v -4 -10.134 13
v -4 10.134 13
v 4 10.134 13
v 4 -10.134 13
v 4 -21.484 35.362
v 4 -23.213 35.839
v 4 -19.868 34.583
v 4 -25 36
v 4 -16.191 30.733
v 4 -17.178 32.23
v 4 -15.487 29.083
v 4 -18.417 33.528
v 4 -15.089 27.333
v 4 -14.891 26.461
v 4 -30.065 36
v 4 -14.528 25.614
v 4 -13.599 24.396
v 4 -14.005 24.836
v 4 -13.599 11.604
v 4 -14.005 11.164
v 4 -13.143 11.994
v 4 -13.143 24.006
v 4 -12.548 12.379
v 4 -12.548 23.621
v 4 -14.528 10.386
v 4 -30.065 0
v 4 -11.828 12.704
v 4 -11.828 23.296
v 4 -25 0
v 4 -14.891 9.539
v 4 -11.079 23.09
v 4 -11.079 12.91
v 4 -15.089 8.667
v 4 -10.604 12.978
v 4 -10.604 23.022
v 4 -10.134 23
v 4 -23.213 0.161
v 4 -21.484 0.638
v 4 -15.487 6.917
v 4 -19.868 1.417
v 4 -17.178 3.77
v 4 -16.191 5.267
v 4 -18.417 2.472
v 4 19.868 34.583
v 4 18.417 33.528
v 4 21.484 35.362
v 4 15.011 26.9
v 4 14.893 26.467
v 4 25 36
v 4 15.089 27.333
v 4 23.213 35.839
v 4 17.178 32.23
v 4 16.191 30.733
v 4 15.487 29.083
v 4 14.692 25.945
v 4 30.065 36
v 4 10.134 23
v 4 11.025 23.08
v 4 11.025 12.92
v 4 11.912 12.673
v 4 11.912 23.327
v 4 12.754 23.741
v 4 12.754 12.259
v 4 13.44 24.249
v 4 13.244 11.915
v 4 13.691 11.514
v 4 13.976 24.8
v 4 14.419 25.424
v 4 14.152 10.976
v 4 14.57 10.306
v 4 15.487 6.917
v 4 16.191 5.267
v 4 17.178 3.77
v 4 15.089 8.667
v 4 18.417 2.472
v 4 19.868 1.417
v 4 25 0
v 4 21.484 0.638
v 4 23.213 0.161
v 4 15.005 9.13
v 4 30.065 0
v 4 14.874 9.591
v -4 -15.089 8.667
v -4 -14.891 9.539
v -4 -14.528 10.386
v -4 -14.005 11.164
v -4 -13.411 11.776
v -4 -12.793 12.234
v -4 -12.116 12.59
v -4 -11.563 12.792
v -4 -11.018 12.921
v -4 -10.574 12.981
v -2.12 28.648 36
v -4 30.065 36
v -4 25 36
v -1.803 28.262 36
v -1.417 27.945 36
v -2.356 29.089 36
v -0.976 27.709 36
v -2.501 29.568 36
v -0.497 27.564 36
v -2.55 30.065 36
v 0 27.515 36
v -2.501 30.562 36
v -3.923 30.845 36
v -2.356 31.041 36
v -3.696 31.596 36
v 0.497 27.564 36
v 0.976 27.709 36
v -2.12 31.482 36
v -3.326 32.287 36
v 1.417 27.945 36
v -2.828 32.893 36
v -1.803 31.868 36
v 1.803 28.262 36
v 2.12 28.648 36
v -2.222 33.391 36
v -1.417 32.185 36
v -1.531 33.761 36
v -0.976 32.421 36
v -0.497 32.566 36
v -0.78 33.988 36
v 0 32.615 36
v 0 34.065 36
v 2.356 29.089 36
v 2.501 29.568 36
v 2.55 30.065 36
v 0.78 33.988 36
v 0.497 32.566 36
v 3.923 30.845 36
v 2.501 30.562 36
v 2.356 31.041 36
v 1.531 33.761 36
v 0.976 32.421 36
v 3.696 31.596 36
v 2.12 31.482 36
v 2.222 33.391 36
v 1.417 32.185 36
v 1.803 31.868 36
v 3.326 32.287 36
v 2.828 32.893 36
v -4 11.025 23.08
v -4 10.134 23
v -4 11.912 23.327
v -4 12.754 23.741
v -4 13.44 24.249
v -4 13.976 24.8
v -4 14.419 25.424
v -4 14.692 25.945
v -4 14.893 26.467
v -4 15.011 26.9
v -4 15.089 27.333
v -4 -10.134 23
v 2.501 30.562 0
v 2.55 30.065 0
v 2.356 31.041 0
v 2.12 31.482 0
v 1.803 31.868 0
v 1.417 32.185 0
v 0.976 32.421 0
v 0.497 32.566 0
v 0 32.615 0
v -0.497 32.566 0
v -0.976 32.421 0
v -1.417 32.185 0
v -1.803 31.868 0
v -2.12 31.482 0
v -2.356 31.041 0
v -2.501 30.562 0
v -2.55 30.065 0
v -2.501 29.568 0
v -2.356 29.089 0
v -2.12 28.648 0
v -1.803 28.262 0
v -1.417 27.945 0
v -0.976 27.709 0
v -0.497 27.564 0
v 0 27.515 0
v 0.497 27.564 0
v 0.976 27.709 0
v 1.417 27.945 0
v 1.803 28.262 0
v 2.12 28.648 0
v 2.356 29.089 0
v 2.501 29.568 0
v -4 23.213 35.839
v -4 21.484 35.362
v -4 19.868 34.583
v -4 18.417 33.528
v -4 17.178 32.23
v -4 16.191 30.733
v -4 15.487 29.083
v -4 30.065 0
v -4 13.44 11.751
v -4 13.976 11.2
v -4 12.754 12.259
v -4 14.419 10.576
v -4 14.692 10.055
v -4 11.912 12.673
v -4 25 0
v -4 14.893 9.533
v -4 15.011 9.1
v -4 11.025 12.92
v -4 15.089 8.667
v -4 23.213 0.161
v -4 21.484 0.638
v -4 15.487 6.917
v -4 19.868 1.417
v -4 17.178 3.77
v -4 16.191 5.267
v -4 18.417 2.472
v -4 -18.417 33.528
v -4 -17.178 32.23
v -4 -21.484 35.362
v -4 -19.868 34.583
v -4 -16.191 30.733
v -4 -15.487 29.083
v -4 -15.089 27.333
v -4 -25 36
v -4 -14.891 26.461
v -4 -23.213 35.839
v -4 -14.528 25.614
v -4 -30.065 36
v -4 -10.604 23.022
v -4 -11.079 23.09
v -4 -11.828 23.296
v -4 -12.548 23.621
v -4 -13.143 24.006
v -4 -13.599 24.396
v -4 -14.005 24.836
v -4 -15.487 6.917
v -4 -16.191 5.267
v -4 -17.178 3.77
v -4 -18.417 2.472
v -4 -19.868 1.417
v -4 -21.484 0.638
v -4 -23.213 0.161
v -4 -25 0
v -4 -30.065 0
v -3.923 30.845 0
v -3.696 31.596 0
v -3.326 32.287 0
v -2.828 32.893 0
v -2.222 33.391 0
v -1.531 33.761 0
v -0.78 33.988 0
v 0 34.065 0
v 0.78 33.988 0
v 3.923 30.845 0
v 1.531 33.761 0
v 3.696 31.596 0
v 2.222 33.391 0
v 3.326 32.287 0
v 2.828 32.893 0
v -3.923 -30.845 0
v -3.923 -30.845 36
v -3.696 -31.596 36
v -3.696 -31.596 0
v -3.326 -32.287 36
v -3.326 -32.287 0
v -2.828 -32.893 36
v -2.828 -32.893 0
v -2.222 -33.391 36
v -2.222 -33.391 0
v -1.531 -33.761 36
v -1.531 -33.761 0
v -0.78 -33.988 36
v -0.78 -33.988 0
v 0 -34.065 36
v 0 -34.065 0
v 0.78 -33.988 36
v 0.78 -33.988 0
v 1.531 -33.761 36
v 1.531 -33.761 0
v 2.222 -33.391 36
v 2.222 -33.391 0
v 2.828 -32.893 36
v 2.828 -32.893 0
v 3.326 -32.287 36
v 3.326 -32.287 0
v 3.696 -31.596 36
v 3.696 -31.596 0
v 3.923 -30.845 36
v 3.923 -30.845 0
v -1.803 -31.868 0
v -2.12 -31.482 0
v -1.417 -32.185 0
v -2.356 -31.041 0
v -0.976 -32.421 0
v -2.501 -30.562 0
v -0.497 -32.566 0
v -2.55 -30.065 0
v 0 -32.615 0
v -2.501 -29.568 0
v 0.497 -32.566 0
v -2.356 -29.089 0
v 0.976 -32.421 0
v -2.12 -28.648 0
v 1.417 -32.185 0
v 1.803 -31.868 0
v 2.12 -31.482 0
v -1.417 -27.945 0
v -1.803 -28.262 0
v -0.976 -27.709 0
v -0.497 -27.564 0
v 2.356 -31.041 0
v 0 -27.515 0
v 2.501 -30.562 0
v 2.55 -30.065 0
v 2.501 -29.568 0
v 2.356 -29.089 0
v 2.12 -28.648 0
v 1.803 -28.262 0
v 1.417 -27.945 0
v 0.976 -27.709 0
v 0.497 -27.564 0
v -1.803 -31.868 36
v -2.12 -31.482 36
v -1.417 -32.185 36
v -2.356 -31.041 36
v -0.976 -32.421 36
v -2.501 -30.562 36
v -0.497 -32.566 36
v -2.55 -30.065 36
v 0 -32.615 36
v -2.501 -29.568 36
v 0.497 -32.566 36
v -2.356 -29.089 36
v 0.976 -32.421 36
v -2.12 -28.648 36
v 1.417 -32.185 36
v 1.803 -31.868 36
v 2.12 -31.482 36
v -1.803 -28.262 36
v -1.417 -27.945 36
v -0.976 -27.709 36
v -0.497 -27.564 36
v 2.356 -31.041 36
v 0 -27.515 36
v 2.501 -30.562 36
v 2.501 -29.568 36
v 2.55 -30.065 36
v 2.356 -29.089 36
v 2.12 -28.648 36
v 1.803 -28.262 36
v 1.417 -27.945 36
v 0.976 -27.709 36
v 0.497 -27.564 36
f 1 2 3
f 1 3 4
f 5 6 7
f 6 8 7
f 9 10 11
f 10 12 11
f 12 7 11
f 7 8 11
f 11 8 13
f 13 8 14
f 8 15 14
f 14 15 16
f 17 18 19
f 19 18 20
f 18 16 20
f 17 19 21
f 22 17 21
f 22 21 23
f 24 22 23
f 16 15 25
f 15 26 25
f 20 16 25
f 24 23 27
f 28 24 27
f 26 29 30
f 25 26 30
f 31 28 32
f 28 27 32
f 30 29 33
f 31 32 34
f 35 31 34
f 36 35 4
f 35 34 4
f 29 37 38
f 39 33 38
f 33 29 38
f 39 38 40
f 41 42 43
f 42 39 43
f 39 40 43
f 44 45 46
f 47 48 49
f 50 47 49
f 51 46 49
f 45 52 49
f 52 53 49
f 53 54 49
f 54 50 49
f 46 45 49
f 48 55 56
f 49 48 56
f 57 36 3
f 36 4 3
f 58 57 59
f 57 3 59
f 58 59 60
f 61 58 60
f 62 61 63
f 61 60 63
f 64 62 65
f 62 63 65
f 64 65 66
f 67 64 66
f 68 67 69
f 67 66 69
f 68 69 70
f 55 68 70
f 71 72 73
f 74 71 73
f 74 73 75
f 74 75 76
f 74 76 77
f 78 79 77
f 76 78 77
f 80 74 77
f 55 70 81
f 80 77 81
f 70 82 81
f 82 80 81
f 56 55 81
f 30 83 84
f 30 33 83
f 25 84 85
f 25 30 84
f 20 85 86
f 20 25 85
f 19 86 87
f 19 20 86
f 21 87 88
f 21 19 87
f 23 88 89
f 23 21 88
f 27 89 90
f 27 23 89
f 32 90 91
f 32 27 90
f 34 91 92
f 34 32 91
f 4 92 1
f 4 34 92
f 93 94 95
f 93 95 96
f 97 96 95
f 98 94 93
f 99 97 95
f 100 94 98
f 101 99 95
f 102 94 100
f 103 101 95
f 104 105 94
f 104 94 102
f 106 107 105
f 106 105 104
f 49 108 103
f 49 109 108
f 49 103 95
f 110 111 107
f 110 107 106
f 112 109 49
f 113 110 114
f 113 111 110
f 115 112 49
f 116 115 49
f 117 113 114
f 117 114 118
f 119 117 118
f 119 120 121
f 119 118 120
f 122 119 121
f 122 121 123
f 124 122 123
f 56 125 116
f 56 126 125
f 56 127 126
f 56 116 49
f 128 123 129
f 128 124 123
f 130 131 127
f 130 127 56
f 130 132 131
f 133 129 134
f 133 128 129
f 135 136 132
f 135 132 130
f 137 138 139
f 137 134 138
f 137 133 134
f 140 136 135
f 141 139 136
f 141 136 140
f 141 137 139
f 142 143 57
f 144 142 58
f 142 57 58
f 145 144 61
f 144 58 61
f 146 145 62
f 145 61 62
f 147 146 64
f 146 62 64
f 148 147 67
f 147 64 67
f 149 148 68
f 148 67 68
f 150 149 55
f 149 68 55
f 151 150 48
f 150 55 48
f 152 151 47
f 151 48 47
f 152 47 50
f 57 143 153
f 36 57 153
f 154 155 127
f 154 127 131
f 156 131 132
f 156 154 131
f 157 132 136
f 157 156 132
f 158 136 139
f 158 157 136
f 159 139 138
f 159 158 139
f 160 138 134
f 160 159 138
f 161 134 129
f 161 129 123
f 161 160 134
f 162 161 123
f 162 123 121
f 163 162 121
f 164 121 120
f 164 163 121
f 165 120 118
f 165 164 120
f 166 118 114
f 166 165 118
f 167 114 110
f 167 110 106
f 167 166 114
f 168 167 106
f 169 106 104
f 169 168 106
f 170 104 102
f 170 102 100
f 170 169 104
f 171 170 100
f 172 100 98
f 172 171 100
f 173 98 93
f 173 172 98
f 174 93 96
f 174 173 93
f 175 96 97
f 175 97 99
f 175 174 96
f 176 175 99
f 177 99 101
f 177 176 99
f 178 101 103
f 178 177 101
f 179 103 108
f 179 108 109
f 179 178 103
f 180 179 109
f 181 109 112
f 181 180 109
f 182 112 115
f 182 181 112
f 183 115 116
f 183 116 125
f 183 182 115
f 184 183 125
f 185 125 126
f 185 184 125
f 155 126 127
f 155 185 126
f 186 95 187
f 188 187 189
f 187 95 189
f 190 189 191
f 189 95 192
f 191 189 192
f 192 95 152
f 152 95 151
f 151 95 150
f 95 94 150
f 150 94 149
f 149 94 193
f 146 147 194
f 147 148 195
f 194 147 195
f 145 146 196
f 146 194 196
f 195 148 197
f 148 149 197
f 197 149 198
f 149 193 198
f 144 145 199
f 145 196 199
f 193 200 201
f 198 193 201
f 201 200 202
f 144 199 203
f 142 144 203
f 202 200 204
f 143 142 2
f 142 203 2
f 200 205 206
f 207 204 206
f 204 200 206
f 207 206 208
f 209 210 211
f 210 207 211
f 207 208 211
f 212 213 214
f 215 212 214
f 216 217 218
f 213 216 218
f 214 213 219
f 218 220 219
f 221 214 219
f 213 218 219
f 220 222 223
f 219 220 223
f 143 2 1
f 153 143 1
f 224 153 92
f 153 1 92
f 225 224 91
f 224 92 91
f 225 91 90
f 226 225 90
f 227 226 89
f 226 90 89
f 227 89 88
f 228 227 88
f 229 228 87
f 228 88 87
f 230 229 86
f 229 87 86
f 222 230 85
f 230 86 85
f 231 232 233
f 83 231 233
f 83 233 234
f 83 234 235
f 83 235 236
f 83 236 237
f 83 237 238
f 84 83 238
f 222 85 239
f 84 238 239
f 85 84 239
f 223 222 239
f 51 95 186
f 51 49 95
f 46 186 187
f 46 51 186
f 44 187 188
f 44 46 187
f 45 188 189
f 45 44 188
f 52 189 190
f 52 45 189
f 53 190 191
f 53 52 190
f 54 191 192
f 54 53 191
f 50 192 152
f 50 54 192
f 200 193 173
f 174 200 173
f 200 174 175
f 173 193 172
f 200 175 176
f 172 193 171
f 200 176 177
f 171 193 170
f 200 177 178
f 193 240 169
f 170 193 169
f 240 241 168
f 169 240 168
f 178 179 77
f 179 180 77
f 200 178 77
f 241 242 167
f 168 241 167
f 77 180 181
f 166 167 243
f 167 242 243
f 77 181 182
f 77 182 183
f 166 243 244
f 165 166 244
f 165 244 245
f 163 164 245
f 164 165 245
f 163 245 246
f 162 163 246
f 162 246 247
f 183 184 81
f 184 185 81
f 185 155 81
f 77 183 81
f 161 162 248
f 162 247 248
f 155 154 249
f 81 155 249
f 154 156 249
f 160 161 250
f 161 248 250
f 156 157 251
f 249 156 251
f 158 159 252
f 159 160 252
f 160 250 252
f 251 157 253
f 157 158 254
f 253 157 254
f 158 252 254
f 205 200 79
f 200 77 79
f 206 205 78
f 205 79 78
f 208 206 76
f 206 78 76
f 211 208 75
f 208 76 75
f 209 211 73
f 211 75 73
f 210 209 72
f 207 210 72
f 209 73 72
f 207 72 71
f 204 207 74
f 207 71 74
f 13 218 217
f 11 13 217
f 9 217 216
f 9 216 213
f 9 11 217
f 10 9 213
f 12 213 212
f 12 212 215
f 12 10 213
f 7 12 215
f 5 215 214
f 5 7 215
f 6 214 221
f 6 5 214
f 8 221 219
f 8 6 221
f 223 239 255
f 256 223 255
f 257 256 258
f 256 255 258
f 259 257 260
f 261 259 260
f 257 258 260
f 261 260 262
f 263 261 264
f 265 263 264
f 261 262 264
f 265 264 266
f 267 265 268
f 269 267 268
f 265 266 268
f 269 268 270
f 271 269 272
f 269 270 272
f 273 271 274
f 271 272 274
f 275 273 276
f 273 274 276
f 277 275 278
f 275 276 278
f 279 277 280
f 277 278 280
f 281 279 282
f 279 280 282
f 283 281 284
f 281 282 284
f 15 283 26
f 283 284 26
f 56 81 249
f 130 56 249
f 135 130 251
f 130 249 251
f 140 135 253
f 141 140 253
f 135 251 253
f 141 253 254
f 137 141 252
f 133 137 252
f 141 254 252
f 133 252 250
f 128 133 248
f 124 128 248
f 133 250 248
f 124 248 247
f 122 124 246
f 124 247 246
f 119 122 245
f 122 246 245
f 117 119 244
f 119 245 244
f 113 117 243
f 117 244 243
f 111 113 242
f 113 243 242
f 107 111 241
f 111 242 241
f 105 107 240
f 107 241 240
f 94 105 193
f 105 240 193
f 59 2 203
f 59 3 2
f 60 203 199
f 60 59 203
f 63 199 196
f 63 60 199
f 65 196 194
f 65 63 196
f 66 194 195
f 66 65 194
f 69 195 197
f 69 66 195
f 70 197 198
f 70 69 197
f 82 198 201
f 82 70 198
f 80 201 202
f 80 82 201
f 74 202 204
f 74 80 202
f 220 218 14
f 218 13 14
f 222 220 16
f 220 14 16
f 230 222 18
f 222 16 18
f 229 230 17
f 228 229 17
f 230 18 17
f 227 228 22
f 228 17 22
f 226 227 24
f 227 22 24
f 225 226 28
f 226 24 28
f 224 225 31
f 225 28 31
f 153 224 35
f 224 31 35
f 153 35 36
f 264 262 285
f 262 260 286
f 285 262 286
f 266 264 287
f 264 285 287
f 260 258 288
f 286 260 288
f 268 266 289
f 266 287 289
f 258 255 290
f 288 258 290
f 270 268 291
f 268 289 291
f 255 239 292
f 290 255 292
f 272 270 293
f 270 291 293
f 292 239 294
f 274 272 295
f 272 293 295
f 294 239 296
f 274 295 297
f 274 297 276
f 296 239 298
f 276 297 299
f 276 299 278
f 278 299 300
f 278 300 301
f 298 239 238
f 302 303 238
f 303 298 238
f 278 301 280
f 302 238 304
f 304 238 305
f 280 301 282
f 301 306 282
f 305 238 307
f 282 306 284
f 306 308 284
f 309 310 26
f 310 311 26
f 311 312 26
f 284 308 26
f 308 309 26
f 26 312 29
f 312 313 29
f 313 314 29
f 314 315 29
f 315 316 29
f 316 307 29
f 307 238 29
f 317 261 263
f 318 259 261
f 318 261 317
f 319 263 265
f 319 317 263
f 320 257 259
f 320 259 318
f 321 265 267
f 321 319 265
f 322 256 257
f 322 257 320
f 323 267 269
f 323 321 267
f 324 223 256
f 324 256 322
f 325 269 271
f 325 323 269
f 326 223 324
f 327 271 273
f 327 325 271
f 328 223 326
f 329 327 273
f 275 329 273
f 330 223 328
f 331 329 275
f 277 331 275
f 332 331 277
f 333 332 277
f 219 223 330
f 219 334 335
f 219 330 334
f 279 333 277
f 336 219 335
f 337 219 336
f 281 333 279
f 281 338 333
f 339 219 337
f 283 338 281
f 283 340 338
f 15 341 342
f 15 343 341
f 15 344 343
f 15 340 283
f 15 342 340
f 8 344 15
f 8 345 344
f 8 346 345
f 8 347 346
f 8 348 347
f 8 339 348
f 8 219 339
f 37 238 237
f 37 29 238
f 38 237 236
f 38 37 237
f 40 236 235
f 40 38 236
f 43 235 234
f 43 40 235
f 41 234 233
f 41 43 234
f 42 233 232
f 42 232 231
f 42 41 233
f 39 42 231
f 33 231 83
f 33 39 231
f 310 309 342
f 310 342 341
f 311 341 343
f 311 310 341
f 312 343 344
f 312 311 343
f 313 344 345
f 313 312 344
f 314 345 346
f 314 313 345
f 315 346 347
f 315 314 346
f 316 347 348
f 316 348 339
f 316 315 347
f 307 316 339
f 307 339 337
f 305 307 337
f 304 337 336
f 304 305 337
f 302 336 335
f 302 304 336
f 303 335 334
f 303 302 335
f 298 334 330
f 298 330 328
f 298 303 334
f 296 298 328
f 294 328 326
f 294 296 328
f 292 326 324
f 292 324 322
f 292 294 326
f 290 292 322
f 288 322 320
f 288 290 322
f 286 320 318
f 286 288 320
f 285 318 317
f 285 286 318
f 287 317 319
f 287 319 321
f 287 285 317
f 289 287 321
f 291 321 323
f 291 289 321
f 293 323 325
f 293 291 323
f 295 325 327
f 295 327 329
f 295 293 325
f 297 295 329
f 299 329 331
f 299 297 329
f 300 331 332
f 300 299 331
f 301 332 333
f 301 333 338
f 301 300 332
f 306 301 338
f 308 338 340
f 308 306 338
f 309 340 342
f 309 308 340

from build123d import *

# Parameters (mm, degrees)
F0_R     = 2.55
F1_DEPTH = 36
F2_W     = 30
F2_H     = 13
F3_DEPTH = 8
F4_R     = 10
F5_R     = 5


with BuildPart() as f1:
    # F0 (on Top) → F1 (new body)
    with BuildSketch(Plane.XY):
        with BuildLine():
            ThreePointArc((4, 30.065), (0, 34.065), (-4, 30.065))
            Line((-4, 30.065), (-4, -30.065))
            ThreePointArc((-4, -30.065), (0, -34.065), (4, -30.065))
            Line((4, -30.065), (4, 30.065))
        make_face()
        with Locations((0, -30.065)):
            Circle(F0_R, mode=Mode.SUBTRACT)
        with Locations((0, 30.065)):
            Circle(F0_R, mode=Mode.SUBTRACT)
    extrude(amount=F1_DEPTH)

    # F2 (on face) → F3 (cut, through all)
    with BuildSketch(Plane(origin=(-4, 0, 0), x_dir=(0, -1, 0), z_dir=(-1, 0, 0))):
        with Locations((0, 29.5)):
            Rectangle(F2_W, F2_H)
        with Locations((0, 6.5)):
            Rectangle(F2_W, F2_H)
    extrude(amount=-F3_DEPTH, mode=Mode.SUBTRACT)

    # F4
    f4_edges = [f1.edges().sort_by_distance(p)[0] for p in [
        (0, 15, 36),
        (0, 15, 0),
        (0, -15, 0),
        (0, -15, 36),
    ]]
    fillet(f4_edges, radius=F4_R)

    # F5
    f5_edges = [f1.edges().sort_by_distance(p)[0] for p in [
        (0, 15, 23),
        (0, -15, 23),
        (0, -15, 13),
        (0, 15, 13),
    ]]
    fillet(f5_edges, radius=F5_R)


solid = f1.part
